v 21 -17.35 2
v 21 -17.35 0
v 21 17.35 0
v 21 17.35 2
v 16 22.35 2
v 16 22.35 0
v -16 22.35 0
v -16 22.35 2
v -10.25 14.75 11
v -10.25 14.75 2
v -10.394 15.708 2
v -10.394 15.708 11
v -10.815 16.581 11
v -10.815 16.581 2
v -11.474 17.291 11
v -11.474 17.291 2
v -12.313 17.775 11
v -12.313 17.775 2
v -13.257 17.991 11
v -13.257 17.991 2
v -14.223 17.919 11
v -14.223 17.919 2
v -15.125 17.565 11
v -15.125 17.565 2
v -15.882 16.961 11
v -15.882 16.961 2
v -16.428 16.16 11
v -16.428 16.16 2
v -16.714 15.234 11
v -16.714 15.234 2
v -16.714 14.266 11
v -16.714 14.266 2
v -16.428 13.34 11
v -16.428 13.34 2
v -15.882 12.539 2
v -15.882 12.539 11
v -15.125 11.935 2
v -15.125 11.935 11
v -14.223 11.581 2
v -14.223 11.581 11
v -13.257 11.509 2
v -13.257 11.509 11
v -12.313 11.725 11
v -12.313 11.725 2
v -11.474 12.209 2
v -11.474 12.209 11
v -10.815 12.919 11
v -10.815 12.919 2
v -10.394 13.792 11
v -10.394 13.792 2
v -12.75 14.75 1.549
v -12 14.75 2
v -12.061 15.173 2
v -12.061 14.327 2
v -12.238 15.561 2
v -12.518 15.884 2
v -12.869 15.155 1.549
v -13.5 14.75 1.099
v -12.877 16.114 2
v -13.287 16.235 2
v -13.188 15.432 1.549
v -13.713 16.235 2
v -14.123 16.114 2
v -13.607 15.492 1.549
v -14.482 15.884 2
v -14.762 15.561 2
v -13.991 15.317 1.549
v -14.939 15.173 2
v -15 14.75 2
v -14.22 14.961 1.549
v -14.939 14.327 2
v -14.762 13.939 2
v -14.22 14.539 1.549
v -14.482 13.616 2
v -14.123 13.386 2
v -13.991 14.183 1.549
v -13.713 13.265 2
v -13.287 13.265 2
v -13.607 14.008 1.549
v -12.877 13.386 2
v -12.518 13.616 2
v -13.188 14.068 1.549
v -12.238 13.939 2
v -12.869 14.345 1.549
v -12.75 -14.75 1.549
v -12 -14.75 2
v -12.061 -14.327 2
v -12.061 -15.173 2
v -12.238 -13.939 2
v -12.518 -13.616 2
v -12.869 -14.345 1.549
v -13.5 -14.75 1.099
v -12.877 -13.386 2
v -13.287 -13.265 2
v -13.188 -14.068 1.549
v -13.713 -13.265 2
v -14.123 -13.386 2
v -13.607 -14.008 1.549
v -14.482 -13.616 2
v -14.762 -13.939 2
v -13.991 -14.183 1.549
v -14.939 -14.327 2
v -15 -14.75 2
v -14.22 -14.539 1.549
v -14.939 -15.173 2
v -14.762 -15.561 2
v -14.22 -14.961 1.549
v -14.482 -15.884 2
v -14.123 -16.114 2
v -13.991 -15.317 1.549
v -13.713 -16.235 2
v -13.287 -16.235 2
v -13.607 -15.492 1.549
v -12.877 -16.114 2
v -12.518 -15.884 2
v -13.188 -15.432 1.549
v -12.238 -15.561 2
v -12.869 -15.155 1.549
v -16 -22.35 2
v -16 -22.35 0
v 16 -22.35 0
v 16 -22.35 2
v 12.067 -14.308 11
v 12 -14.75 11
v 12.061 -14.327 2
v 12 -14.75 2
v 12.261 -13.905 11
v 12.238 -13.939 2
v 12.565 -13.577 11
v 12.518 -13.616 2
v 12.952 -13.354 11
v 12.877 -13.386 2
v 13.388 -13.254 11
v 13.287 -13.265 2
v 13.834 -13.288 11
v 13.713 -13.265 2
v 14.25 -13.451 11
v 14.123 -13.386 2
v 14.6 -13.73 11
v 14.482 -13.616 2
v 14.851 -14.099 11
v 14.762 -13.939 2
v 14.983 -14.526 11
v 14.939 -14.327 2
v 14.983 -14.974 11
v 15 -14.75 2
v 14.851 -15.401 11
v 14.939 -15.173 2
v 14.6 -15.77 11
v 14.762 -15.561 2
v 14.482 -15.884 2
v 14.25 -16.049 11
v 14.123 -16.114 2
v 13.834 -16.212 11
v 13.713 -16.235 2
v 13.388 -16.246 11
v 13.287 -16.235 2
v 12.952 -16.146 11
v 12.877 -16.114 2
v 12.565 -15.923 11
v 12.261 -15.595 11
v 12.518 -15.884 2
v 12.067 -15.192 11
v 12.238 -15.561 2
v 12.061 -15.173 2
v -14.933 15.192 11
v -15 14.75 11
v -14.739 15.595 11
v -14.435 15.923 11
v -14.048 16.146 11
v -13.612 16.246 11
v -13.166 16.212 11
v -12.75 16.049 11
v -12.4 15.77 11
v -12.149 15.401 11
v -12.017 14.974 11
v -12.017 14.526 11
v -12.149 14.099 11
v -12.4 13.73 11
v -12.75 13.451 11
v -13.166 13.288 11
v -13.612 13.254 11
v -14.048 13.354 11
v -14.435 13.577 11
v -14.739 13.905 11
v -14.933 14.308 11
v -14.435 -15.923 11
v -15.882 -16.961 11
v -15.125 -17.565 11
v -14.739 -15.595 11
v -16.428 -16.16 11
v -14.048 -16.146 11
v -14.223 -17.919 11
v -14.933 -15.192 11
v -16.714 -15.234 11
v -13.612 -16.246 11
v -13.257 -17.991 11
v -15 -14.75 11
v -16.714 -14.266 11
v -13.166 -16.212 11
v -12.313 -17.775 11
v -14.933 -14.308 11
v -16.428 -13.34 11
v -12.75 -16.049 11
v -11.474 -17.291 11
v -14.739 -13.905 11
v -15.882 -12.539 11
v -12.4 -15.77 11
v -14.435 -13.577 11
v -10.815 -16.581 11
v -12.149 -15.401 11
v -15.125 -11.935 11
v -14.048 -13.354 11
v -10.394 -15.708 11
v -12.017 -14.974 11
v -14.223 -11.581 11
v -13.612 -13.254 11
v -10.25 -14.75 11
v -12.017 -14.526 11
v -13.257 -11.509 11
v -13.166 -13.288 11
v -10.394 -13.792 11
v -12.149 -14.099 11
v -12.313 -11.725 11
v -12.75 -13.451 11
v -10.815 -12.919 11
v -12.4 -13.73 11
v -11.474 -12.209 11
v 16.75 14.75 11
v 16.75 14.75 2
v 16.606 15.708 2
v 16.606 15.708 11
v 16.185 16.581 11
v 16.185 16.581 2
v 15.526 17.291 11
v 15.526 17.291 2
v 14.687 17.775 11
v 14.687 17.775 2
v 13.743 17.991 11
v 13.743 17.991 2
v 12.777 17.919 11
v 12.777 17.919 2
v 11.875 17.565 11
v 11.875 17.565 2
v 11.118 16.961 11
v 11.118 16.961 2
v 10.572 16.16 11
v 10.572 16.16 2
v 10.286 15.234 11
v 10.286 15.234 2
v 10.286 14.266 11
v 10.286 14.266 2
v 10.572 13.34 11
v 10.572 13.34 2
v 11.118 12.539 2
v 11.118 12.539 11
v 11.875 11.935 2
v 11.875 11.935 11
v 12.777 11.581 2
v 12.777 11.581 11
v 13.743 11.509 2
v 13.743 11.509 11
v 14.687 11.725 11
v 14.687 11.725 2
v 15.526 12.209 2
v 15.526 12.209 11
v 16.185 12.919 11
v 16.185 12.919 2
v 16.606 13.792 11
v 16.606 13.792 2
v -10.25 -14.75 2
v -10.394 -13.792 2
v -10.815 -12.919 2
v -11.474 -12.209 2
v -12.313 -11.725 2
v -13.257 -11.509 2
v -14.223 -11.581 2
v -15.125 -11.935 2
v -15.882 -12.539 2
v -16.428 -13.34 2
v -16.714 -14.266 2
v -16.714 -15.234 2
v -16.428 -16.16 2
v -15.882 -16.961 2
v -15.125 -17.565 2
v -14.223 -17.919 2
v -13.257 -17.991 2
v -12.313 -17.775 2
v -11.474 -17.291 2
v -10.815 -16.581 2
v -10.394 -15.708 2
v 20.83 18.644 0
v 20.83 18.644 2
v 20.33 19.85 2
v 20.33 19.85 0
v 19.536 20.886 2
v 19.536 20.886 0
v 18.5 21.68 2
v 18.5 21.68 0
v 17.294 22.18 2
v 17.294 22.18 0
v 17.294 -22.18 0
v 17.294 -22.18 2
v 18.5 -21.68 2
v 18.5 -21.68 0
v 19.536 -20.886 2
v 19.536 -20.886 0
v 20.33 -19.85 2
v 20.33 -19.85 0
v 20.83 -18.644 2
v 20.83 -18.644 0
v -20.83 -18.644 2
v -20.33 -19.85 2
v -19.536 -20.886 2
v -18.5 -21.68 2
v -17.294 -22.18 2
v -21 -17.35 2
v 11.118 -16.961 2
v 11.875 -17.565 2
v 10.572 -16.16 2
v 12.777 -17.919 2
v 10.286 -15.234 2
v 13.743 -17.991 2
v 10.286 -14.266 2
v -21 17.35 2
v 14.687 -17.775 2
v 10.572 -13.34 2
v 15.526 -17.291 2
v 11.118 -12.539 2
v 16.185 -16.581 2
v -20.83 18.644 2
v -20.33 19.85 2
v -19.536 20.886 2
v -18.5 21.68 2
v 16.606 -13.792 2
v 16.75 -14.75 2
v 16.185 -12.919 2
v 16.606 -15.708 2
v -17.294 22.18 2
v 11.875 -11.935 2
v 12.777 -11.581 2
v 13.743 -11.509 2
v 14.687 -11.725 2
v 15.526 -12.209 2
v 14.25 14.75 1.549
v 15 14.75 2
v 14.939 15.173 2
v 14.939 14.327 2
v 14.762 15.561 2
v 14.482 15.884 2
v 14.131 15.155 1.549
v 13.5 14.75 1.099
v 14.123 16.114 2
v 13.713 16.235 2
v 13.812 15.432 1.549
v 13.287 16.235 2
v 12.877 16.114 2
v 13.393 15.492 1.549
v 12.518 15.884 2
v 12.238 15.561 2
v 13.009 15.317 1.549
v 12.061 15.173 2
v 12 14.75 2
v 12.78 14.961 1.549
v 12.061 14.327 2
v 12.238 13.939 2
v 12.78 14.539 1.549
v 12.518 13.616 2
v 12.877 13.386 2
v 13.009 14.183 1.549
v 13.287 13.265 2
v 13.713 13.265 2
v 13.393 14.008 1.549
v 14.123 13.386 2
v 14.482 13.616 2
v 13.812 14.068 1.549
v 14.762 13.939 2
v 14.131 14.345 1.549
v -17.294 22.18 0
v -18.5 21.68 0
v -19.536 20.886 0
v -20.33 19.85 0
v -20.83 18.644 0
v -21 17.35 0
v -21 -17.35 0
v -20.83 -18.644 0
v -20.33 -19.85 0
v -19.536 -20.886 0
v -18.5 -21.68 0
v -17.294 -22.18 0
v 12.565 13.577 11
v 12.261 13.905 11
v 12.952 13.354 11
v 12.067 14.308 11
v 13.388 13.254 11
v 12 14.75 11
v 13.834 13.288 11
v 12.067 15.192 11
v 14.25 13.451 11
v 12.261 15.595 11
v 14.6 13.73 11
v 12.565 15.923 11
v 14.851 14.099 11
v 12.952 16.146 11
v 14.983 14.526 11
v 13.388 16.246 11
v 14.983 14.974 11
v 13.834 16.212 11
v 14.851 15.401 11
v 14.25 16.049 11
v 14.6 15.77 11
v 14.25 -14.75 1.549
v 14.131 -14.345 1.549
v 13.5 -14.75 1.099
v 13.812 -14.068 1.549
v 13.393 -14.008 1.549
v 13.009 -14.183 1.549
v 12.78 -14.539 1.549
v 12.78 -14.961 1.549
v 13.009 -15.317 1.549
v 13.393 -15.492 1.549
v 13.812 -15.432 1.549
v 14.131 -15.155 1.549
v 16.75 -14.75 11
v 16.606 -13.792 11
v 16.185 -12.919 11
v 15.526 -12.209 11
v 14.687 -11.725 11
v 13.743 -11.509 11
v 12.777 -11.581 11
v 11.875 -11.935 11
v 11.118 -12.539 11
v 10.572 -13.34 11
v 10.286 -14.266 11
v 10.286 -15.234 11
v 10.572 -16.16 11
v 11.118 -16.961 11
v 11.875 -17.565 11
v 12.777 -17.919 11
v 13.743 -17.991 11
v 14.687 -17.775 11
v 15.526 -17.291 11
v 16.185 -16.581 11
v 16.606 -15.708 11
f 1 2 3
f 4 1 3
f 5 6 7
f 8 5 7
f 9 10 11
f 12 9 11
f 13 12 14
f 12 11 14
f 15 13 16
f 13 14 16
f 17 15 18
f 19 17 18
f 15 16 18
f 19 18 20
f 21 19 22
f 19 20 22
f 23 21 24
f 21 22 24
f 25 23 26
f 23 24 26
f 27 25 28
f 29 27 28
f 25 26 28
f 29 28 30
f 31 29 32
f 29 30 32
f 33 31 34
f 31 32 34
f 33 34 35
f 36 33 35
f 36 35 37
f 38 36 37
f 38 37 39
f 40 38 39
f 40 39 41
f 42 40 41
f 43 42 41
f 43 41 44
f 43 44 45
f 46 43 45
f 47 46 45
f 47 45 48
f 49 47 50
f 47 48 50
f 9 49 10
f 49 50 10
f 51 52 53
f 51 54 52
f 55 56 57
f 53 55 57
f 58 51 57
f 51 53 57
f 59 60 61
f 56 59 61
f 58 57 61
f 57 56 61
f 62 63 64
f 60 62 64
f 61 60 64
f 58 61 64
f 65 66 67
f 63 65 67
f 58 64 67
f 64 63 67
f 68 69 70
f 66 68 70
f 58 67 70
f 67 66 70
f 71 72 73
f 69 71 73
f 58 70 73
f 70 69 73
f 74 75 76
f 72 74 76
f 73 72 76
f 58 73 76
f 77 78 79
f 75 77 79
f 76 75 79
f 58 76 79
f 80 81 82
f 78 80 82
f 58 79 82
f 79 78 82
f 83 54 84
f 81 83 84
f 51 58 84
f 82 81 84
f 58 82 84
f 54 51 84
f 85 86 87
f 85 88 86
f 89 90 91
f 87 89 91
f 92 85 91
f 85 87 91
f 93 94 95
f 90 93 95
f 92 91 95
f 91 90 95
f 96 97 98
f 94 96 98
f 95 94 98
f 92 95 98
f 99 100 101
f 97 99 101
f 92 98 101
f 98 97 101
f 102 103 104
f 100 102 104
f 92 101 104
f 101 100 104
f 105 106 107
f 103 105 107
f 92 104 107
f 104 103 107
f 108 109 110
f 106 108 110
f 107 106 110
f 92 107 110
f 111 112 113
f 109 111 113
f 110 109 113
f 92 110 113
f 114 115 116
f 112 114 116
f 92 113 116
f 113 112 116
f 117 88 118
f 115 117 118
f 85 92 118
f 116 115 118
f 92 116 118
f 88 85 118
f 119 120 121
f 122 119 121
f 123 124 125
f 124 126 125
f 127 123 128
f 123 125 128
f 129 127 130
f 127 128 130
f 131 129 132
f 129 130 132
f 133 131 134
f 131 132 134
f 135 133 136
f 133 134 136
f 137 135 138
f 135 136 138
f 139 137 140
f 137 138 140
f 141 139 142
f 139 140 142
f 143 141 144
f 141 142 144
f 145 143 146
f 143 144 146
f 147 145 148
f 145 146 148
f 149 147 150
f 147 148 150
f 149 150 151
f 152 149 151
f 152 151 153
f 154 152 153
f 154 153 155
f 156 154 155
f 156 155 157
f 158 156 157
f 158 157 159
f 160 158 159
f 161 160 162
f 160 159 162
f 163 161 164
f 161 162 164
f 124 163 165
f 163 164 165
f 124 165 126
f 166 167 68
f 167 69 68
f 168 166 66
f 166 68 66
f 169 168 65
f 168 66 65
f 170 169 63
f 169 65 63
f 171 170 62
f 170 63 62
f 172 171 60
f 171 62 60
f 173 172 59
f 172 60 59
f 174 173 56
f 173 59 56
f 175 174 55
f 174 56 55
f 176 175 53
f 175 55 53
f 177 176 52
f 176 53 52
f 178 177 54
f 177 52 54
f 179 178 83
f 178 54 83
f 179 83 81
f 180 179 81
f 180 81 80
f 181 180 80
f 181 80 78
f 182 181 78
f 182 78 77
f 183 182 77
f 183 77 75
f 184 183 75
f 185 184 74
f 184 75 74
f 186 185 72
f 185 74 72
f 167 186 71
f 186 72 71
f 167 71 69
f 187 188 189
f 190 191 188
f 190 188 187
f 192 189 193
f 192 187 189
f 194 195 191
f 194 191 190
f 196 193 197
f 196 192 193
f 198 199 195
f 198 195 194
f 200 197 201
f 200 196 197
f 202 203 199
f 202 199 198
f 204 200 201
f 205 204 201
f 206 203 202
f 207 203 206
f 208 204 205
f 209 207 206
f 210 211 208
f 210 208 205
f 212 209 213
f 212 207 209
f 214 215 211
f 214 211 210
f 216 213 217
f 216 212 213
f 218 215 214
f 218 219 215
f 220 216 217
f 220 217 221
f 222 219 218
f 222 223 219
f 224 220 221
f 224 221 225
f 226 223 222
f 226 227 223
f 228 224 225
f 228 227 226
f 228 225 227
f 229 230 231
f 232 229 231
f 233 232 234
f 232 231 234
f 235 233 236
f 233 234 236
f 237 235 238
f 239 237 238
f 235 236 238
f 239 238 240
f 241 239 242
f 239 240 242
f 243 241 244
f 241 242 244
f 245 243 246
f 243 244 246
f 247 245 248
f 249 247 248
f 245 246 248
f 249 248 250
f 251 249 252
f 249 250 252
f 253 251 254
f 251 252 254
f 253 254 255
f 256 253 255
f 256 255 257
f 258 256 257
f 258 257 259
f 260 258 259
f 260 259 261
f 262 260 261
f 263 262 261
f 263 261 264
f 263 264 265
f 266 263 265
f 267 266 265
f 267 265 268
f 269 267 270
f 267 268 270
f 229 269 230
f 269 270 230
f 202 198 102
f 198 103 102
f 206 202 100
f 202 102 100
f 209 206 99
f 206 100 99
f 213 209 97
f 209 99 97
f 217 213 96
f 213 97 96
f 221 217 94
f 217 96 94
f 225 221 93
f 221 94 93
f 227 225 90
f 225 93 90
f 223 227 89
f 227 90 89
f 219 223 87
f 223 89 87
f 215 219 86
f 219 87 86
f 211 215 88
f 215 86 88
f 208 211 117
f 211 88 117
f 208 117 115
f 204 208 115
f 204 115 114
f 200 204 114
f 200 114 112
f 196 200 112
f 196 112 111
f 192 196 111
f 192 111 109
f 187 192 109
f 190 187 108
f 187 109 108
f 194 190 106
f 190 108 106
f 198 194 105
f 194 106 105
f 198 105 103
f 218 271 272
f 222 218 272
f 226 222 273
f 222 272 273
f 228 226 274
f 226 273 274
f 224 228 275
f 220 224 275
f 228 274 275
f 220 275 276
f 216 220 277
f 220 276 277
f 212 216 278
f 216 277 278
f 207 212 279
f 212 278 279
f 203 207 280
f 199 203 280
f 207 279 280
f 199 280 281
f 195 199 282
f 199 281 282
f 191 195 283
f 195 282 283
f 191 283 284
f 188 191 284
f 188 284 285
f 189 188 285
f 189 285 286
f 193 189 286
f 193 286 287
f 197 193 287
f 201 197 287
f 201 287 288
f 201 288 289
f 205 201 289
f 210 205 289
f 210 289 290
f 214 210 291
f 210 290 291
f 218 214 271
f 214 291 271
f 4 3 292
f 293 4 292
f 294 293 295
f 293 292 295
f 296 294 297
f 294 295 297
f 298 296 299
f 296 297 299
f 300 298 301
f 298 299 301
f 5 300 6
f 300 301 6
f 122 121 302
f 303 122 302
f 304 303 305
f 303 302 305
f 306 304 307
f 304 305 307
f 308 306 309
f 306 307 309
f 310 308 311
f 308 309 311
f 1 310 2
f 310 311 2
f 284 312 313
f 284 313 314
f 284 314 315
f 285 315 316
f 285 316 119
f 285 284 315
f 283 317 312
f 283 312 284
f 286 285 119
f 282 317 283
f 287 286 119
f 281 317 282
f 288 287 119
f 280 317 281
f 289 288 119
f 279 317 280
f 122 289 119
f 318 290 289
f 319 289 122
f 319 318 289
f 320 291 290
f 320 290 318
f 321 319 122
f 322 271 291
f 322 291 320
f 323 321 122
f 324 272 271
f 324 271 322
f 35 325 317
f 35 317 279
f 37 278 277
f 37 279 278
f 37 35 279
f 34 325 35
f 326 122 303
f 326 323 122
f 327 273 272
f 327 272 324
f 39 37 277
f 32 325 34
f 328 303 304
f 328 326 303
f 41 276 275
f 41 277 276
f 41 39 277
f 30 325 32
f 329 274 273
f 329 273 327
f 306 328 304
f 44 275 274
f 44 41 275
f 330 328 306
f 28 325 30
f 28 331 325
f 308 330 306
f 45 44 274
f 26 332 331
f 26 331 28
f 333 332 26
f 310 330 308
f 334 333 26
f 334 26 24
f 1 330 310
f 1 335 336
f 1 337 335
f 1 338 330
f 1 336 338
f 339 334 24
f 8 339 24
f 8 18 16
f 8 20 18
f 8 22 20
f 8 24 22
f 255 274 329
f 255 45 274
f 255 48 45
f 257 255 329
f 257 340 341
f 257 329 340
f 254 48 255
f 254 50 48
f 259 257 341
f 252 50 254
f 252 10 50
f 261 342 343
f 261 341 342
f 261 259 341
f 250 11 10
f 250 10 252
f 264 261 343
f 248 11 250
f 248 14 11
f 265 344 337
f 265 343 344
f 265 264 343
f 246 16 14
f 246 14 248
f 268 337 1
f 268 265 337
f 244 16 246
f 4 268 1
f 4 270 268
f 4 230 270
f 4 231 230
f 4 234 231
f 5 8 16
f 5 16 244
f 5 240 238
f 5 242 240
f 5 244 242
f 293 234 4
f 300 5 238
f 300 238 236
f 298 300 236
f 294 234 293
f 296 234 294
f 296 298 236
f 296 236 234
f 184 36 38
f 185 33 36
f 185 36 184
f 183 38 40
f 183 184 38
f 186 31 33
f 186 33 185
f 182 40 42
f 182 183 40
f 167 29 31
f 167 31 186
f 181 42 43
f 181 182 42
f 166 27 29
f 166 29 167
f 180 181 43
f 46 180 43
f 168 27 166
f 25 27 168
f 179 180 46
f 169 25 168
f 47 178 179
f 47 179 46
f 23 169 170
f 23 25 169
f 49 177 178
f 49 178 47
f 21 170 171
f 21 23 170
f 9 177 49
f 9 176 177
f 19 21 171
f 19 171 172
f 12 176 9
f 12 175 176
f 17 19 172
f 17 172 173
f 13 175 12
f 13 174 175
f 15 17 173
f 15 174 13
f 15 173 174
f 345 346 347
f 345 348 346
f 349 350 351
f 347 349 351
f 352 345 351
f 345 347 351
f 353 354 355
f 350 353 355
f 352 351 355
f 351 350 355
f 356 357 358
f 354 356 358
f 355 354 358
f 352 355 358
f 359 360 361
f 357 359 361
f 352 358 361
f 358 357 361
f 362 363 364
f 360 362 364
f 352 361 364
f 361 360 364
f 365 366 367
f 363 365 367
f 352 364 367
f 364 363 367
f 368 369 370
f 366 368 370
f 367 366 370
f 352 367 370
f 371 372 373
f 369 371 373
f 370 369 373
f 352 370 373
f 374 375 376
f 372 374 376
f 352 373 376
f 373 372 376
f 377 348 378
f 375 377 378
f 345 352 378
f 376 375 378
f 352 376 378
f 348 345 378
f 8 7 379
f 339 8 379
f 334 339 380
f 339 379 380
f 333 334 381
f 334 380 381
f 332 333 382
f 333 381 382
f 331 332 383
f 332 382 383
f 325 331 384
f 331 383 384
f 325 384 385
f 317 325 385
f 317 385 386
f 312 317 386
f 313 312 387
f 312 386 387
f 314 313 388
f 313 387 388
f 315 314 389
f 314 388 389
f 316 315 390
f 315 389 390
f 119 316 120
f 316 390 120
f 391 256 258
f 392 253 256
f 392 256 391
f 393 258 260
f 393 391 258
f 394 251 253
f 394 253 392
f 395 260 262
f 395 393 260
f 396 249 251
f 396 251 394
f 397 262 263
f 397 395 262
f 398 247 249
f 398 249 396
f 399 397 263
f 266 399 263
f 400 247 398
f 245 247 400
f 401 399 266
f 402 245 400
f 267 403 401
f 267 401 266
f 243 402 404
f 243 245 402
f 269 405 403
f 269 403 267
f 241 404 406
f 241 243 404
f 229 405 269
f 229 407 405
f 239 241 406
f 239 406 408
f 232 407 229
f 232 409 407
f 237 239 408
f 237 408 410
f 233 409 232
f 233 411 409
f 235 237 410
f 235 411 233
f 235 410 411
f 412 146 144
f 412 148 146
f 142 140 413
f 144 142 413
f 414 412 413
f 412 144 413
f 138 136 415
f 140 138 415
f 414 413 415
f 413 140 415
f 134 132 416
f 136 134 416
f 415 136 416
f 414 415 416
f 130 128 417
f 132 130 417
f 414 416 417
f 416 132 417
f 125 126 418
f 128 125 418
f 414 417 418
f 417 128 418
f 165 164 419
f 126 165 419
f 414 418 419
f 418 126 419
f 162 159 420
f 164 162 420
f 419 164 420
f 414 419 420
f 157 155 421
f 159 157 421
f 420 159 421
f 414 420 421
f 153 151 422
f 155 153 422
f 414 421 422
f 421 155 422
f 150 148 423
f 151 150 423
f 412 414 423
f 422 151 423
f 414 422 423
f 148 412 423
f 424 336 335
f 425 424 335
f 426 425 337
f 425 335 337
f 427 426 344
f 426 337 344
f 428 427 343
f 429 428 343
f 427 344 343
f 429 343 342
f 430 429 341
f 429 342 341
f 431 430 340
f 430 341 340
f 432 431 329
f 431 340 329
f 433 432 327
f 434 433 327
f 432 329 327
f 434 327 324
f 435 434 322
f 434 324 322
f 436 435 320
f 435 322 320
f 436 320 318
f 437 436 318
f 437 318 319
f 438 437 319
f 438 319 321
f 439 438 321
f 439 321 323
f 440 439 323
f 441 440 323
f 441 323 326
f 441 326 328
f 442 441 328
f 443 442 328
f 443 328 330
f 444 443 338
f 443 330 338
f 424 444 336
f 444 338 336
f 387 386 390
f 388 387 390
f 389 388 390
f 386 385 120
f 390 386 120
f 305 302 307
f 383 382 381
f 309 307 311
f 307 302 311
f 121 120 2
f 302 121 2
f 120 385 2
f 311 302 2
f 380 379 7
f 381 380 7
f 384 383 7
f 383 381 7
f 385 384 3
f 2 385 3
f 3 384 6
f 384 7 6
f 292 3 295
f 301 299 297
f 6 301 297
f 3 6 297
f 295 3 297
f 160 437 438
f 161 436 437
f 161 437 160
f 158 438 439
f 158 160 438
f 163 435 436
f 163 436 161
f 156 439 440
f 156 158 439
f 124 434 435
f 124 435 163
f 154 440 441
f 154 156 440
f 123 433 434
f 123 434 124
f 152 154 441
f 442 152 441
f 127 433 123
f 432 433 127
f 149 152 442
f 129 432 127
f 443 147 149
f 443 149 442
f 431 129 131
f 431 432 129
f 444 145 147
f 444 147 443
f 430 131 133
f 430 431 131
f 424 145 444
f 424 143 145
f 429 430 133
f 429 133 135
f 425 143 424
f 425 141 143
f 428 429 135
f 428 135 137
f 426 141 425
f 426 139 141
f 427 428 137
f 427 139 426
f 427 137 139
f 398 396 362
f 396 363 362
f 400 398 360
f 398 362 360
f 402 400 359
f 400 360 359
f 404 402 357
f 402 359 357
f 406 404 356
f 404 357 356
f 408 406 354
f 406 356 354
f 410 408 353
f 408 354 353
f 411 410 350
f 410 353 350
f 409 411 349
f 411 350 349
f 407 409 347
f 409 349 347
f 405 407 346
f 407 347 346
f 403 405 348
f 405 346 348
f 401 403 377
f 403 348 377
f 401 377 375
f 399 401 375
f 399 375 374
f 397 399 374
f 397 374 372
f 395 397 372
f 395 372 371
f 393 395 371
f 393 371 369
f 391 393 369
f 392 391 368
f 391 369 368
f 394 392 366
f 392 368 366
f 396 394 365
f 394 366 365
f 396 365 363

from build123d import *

# Parameters (mm, degrees)
F1_DEPTH = 2
F2_R     = 3.25
F3_DEPTH = 9
F5_D     = 3
F5_DEPTH = 9
F5_TIP   = 0.9012909285


with BuildPart() as f1:
    # F0 (on Top) → F1 (new body)
    with BuildSketch(Plane.XY):
        with BuildLine():
            ThreePointArc((21, 17.35), (19.5355339059, 20.8855339059), (16, 22.35))
            Line((16, 22.35), (-16, 22.35))
            ThreePointArc((-16, 22.35), (-19.5355339059, 20.8855339059), (-21, 17.35))
            Line((-21, 17.35), (-21, -17.35))
            ThreePointArc((-21, -17.35), (-19.5355339059, -20.8855339059), (-16, -22.35))
            Line((-16, -22.35), (16, -22.35))
            ThreePointArc((16, -22.35), (19.5355339059, -20.8855339059), (21, -17.35))
            Line((21, -17.35), (21, 17.35))
        make_face()
    extrude(amount=F1_DEPTH)

    # F2 (on face) → F3 (join)
    with BuildSketch(Plane.XY.offset(2)):
        with Locations((13.5, -14.75)):
            Circle(F2_R)
        with Locations((-13.5, 14.75)):
            Circle(F2_R)
        with Locations((13.5, 14.75)):
            Circle(F2_R)
        with Locations((-13.5, -14.75)):
            Circle(F2_R)
    extrude(amount=F3_DEPTH)

    # F5
    with Locations(Plane.XY.offset(11)):
        with Locations((-13.5, 14.75), (13.5, 14.75), (13.5, -14.75), (-13.5, -14.75)):
            Hole(F5_D / 2, depth=F5_DEPTH)
            with Locations((0, 0, -(F5_DEPTH + F5_TIP / 2))):  # 118° drill point
                Cone(0, F5_D / 2, F5_TIP, mode=Mode.SUBTRACT)


solid = f1.part
